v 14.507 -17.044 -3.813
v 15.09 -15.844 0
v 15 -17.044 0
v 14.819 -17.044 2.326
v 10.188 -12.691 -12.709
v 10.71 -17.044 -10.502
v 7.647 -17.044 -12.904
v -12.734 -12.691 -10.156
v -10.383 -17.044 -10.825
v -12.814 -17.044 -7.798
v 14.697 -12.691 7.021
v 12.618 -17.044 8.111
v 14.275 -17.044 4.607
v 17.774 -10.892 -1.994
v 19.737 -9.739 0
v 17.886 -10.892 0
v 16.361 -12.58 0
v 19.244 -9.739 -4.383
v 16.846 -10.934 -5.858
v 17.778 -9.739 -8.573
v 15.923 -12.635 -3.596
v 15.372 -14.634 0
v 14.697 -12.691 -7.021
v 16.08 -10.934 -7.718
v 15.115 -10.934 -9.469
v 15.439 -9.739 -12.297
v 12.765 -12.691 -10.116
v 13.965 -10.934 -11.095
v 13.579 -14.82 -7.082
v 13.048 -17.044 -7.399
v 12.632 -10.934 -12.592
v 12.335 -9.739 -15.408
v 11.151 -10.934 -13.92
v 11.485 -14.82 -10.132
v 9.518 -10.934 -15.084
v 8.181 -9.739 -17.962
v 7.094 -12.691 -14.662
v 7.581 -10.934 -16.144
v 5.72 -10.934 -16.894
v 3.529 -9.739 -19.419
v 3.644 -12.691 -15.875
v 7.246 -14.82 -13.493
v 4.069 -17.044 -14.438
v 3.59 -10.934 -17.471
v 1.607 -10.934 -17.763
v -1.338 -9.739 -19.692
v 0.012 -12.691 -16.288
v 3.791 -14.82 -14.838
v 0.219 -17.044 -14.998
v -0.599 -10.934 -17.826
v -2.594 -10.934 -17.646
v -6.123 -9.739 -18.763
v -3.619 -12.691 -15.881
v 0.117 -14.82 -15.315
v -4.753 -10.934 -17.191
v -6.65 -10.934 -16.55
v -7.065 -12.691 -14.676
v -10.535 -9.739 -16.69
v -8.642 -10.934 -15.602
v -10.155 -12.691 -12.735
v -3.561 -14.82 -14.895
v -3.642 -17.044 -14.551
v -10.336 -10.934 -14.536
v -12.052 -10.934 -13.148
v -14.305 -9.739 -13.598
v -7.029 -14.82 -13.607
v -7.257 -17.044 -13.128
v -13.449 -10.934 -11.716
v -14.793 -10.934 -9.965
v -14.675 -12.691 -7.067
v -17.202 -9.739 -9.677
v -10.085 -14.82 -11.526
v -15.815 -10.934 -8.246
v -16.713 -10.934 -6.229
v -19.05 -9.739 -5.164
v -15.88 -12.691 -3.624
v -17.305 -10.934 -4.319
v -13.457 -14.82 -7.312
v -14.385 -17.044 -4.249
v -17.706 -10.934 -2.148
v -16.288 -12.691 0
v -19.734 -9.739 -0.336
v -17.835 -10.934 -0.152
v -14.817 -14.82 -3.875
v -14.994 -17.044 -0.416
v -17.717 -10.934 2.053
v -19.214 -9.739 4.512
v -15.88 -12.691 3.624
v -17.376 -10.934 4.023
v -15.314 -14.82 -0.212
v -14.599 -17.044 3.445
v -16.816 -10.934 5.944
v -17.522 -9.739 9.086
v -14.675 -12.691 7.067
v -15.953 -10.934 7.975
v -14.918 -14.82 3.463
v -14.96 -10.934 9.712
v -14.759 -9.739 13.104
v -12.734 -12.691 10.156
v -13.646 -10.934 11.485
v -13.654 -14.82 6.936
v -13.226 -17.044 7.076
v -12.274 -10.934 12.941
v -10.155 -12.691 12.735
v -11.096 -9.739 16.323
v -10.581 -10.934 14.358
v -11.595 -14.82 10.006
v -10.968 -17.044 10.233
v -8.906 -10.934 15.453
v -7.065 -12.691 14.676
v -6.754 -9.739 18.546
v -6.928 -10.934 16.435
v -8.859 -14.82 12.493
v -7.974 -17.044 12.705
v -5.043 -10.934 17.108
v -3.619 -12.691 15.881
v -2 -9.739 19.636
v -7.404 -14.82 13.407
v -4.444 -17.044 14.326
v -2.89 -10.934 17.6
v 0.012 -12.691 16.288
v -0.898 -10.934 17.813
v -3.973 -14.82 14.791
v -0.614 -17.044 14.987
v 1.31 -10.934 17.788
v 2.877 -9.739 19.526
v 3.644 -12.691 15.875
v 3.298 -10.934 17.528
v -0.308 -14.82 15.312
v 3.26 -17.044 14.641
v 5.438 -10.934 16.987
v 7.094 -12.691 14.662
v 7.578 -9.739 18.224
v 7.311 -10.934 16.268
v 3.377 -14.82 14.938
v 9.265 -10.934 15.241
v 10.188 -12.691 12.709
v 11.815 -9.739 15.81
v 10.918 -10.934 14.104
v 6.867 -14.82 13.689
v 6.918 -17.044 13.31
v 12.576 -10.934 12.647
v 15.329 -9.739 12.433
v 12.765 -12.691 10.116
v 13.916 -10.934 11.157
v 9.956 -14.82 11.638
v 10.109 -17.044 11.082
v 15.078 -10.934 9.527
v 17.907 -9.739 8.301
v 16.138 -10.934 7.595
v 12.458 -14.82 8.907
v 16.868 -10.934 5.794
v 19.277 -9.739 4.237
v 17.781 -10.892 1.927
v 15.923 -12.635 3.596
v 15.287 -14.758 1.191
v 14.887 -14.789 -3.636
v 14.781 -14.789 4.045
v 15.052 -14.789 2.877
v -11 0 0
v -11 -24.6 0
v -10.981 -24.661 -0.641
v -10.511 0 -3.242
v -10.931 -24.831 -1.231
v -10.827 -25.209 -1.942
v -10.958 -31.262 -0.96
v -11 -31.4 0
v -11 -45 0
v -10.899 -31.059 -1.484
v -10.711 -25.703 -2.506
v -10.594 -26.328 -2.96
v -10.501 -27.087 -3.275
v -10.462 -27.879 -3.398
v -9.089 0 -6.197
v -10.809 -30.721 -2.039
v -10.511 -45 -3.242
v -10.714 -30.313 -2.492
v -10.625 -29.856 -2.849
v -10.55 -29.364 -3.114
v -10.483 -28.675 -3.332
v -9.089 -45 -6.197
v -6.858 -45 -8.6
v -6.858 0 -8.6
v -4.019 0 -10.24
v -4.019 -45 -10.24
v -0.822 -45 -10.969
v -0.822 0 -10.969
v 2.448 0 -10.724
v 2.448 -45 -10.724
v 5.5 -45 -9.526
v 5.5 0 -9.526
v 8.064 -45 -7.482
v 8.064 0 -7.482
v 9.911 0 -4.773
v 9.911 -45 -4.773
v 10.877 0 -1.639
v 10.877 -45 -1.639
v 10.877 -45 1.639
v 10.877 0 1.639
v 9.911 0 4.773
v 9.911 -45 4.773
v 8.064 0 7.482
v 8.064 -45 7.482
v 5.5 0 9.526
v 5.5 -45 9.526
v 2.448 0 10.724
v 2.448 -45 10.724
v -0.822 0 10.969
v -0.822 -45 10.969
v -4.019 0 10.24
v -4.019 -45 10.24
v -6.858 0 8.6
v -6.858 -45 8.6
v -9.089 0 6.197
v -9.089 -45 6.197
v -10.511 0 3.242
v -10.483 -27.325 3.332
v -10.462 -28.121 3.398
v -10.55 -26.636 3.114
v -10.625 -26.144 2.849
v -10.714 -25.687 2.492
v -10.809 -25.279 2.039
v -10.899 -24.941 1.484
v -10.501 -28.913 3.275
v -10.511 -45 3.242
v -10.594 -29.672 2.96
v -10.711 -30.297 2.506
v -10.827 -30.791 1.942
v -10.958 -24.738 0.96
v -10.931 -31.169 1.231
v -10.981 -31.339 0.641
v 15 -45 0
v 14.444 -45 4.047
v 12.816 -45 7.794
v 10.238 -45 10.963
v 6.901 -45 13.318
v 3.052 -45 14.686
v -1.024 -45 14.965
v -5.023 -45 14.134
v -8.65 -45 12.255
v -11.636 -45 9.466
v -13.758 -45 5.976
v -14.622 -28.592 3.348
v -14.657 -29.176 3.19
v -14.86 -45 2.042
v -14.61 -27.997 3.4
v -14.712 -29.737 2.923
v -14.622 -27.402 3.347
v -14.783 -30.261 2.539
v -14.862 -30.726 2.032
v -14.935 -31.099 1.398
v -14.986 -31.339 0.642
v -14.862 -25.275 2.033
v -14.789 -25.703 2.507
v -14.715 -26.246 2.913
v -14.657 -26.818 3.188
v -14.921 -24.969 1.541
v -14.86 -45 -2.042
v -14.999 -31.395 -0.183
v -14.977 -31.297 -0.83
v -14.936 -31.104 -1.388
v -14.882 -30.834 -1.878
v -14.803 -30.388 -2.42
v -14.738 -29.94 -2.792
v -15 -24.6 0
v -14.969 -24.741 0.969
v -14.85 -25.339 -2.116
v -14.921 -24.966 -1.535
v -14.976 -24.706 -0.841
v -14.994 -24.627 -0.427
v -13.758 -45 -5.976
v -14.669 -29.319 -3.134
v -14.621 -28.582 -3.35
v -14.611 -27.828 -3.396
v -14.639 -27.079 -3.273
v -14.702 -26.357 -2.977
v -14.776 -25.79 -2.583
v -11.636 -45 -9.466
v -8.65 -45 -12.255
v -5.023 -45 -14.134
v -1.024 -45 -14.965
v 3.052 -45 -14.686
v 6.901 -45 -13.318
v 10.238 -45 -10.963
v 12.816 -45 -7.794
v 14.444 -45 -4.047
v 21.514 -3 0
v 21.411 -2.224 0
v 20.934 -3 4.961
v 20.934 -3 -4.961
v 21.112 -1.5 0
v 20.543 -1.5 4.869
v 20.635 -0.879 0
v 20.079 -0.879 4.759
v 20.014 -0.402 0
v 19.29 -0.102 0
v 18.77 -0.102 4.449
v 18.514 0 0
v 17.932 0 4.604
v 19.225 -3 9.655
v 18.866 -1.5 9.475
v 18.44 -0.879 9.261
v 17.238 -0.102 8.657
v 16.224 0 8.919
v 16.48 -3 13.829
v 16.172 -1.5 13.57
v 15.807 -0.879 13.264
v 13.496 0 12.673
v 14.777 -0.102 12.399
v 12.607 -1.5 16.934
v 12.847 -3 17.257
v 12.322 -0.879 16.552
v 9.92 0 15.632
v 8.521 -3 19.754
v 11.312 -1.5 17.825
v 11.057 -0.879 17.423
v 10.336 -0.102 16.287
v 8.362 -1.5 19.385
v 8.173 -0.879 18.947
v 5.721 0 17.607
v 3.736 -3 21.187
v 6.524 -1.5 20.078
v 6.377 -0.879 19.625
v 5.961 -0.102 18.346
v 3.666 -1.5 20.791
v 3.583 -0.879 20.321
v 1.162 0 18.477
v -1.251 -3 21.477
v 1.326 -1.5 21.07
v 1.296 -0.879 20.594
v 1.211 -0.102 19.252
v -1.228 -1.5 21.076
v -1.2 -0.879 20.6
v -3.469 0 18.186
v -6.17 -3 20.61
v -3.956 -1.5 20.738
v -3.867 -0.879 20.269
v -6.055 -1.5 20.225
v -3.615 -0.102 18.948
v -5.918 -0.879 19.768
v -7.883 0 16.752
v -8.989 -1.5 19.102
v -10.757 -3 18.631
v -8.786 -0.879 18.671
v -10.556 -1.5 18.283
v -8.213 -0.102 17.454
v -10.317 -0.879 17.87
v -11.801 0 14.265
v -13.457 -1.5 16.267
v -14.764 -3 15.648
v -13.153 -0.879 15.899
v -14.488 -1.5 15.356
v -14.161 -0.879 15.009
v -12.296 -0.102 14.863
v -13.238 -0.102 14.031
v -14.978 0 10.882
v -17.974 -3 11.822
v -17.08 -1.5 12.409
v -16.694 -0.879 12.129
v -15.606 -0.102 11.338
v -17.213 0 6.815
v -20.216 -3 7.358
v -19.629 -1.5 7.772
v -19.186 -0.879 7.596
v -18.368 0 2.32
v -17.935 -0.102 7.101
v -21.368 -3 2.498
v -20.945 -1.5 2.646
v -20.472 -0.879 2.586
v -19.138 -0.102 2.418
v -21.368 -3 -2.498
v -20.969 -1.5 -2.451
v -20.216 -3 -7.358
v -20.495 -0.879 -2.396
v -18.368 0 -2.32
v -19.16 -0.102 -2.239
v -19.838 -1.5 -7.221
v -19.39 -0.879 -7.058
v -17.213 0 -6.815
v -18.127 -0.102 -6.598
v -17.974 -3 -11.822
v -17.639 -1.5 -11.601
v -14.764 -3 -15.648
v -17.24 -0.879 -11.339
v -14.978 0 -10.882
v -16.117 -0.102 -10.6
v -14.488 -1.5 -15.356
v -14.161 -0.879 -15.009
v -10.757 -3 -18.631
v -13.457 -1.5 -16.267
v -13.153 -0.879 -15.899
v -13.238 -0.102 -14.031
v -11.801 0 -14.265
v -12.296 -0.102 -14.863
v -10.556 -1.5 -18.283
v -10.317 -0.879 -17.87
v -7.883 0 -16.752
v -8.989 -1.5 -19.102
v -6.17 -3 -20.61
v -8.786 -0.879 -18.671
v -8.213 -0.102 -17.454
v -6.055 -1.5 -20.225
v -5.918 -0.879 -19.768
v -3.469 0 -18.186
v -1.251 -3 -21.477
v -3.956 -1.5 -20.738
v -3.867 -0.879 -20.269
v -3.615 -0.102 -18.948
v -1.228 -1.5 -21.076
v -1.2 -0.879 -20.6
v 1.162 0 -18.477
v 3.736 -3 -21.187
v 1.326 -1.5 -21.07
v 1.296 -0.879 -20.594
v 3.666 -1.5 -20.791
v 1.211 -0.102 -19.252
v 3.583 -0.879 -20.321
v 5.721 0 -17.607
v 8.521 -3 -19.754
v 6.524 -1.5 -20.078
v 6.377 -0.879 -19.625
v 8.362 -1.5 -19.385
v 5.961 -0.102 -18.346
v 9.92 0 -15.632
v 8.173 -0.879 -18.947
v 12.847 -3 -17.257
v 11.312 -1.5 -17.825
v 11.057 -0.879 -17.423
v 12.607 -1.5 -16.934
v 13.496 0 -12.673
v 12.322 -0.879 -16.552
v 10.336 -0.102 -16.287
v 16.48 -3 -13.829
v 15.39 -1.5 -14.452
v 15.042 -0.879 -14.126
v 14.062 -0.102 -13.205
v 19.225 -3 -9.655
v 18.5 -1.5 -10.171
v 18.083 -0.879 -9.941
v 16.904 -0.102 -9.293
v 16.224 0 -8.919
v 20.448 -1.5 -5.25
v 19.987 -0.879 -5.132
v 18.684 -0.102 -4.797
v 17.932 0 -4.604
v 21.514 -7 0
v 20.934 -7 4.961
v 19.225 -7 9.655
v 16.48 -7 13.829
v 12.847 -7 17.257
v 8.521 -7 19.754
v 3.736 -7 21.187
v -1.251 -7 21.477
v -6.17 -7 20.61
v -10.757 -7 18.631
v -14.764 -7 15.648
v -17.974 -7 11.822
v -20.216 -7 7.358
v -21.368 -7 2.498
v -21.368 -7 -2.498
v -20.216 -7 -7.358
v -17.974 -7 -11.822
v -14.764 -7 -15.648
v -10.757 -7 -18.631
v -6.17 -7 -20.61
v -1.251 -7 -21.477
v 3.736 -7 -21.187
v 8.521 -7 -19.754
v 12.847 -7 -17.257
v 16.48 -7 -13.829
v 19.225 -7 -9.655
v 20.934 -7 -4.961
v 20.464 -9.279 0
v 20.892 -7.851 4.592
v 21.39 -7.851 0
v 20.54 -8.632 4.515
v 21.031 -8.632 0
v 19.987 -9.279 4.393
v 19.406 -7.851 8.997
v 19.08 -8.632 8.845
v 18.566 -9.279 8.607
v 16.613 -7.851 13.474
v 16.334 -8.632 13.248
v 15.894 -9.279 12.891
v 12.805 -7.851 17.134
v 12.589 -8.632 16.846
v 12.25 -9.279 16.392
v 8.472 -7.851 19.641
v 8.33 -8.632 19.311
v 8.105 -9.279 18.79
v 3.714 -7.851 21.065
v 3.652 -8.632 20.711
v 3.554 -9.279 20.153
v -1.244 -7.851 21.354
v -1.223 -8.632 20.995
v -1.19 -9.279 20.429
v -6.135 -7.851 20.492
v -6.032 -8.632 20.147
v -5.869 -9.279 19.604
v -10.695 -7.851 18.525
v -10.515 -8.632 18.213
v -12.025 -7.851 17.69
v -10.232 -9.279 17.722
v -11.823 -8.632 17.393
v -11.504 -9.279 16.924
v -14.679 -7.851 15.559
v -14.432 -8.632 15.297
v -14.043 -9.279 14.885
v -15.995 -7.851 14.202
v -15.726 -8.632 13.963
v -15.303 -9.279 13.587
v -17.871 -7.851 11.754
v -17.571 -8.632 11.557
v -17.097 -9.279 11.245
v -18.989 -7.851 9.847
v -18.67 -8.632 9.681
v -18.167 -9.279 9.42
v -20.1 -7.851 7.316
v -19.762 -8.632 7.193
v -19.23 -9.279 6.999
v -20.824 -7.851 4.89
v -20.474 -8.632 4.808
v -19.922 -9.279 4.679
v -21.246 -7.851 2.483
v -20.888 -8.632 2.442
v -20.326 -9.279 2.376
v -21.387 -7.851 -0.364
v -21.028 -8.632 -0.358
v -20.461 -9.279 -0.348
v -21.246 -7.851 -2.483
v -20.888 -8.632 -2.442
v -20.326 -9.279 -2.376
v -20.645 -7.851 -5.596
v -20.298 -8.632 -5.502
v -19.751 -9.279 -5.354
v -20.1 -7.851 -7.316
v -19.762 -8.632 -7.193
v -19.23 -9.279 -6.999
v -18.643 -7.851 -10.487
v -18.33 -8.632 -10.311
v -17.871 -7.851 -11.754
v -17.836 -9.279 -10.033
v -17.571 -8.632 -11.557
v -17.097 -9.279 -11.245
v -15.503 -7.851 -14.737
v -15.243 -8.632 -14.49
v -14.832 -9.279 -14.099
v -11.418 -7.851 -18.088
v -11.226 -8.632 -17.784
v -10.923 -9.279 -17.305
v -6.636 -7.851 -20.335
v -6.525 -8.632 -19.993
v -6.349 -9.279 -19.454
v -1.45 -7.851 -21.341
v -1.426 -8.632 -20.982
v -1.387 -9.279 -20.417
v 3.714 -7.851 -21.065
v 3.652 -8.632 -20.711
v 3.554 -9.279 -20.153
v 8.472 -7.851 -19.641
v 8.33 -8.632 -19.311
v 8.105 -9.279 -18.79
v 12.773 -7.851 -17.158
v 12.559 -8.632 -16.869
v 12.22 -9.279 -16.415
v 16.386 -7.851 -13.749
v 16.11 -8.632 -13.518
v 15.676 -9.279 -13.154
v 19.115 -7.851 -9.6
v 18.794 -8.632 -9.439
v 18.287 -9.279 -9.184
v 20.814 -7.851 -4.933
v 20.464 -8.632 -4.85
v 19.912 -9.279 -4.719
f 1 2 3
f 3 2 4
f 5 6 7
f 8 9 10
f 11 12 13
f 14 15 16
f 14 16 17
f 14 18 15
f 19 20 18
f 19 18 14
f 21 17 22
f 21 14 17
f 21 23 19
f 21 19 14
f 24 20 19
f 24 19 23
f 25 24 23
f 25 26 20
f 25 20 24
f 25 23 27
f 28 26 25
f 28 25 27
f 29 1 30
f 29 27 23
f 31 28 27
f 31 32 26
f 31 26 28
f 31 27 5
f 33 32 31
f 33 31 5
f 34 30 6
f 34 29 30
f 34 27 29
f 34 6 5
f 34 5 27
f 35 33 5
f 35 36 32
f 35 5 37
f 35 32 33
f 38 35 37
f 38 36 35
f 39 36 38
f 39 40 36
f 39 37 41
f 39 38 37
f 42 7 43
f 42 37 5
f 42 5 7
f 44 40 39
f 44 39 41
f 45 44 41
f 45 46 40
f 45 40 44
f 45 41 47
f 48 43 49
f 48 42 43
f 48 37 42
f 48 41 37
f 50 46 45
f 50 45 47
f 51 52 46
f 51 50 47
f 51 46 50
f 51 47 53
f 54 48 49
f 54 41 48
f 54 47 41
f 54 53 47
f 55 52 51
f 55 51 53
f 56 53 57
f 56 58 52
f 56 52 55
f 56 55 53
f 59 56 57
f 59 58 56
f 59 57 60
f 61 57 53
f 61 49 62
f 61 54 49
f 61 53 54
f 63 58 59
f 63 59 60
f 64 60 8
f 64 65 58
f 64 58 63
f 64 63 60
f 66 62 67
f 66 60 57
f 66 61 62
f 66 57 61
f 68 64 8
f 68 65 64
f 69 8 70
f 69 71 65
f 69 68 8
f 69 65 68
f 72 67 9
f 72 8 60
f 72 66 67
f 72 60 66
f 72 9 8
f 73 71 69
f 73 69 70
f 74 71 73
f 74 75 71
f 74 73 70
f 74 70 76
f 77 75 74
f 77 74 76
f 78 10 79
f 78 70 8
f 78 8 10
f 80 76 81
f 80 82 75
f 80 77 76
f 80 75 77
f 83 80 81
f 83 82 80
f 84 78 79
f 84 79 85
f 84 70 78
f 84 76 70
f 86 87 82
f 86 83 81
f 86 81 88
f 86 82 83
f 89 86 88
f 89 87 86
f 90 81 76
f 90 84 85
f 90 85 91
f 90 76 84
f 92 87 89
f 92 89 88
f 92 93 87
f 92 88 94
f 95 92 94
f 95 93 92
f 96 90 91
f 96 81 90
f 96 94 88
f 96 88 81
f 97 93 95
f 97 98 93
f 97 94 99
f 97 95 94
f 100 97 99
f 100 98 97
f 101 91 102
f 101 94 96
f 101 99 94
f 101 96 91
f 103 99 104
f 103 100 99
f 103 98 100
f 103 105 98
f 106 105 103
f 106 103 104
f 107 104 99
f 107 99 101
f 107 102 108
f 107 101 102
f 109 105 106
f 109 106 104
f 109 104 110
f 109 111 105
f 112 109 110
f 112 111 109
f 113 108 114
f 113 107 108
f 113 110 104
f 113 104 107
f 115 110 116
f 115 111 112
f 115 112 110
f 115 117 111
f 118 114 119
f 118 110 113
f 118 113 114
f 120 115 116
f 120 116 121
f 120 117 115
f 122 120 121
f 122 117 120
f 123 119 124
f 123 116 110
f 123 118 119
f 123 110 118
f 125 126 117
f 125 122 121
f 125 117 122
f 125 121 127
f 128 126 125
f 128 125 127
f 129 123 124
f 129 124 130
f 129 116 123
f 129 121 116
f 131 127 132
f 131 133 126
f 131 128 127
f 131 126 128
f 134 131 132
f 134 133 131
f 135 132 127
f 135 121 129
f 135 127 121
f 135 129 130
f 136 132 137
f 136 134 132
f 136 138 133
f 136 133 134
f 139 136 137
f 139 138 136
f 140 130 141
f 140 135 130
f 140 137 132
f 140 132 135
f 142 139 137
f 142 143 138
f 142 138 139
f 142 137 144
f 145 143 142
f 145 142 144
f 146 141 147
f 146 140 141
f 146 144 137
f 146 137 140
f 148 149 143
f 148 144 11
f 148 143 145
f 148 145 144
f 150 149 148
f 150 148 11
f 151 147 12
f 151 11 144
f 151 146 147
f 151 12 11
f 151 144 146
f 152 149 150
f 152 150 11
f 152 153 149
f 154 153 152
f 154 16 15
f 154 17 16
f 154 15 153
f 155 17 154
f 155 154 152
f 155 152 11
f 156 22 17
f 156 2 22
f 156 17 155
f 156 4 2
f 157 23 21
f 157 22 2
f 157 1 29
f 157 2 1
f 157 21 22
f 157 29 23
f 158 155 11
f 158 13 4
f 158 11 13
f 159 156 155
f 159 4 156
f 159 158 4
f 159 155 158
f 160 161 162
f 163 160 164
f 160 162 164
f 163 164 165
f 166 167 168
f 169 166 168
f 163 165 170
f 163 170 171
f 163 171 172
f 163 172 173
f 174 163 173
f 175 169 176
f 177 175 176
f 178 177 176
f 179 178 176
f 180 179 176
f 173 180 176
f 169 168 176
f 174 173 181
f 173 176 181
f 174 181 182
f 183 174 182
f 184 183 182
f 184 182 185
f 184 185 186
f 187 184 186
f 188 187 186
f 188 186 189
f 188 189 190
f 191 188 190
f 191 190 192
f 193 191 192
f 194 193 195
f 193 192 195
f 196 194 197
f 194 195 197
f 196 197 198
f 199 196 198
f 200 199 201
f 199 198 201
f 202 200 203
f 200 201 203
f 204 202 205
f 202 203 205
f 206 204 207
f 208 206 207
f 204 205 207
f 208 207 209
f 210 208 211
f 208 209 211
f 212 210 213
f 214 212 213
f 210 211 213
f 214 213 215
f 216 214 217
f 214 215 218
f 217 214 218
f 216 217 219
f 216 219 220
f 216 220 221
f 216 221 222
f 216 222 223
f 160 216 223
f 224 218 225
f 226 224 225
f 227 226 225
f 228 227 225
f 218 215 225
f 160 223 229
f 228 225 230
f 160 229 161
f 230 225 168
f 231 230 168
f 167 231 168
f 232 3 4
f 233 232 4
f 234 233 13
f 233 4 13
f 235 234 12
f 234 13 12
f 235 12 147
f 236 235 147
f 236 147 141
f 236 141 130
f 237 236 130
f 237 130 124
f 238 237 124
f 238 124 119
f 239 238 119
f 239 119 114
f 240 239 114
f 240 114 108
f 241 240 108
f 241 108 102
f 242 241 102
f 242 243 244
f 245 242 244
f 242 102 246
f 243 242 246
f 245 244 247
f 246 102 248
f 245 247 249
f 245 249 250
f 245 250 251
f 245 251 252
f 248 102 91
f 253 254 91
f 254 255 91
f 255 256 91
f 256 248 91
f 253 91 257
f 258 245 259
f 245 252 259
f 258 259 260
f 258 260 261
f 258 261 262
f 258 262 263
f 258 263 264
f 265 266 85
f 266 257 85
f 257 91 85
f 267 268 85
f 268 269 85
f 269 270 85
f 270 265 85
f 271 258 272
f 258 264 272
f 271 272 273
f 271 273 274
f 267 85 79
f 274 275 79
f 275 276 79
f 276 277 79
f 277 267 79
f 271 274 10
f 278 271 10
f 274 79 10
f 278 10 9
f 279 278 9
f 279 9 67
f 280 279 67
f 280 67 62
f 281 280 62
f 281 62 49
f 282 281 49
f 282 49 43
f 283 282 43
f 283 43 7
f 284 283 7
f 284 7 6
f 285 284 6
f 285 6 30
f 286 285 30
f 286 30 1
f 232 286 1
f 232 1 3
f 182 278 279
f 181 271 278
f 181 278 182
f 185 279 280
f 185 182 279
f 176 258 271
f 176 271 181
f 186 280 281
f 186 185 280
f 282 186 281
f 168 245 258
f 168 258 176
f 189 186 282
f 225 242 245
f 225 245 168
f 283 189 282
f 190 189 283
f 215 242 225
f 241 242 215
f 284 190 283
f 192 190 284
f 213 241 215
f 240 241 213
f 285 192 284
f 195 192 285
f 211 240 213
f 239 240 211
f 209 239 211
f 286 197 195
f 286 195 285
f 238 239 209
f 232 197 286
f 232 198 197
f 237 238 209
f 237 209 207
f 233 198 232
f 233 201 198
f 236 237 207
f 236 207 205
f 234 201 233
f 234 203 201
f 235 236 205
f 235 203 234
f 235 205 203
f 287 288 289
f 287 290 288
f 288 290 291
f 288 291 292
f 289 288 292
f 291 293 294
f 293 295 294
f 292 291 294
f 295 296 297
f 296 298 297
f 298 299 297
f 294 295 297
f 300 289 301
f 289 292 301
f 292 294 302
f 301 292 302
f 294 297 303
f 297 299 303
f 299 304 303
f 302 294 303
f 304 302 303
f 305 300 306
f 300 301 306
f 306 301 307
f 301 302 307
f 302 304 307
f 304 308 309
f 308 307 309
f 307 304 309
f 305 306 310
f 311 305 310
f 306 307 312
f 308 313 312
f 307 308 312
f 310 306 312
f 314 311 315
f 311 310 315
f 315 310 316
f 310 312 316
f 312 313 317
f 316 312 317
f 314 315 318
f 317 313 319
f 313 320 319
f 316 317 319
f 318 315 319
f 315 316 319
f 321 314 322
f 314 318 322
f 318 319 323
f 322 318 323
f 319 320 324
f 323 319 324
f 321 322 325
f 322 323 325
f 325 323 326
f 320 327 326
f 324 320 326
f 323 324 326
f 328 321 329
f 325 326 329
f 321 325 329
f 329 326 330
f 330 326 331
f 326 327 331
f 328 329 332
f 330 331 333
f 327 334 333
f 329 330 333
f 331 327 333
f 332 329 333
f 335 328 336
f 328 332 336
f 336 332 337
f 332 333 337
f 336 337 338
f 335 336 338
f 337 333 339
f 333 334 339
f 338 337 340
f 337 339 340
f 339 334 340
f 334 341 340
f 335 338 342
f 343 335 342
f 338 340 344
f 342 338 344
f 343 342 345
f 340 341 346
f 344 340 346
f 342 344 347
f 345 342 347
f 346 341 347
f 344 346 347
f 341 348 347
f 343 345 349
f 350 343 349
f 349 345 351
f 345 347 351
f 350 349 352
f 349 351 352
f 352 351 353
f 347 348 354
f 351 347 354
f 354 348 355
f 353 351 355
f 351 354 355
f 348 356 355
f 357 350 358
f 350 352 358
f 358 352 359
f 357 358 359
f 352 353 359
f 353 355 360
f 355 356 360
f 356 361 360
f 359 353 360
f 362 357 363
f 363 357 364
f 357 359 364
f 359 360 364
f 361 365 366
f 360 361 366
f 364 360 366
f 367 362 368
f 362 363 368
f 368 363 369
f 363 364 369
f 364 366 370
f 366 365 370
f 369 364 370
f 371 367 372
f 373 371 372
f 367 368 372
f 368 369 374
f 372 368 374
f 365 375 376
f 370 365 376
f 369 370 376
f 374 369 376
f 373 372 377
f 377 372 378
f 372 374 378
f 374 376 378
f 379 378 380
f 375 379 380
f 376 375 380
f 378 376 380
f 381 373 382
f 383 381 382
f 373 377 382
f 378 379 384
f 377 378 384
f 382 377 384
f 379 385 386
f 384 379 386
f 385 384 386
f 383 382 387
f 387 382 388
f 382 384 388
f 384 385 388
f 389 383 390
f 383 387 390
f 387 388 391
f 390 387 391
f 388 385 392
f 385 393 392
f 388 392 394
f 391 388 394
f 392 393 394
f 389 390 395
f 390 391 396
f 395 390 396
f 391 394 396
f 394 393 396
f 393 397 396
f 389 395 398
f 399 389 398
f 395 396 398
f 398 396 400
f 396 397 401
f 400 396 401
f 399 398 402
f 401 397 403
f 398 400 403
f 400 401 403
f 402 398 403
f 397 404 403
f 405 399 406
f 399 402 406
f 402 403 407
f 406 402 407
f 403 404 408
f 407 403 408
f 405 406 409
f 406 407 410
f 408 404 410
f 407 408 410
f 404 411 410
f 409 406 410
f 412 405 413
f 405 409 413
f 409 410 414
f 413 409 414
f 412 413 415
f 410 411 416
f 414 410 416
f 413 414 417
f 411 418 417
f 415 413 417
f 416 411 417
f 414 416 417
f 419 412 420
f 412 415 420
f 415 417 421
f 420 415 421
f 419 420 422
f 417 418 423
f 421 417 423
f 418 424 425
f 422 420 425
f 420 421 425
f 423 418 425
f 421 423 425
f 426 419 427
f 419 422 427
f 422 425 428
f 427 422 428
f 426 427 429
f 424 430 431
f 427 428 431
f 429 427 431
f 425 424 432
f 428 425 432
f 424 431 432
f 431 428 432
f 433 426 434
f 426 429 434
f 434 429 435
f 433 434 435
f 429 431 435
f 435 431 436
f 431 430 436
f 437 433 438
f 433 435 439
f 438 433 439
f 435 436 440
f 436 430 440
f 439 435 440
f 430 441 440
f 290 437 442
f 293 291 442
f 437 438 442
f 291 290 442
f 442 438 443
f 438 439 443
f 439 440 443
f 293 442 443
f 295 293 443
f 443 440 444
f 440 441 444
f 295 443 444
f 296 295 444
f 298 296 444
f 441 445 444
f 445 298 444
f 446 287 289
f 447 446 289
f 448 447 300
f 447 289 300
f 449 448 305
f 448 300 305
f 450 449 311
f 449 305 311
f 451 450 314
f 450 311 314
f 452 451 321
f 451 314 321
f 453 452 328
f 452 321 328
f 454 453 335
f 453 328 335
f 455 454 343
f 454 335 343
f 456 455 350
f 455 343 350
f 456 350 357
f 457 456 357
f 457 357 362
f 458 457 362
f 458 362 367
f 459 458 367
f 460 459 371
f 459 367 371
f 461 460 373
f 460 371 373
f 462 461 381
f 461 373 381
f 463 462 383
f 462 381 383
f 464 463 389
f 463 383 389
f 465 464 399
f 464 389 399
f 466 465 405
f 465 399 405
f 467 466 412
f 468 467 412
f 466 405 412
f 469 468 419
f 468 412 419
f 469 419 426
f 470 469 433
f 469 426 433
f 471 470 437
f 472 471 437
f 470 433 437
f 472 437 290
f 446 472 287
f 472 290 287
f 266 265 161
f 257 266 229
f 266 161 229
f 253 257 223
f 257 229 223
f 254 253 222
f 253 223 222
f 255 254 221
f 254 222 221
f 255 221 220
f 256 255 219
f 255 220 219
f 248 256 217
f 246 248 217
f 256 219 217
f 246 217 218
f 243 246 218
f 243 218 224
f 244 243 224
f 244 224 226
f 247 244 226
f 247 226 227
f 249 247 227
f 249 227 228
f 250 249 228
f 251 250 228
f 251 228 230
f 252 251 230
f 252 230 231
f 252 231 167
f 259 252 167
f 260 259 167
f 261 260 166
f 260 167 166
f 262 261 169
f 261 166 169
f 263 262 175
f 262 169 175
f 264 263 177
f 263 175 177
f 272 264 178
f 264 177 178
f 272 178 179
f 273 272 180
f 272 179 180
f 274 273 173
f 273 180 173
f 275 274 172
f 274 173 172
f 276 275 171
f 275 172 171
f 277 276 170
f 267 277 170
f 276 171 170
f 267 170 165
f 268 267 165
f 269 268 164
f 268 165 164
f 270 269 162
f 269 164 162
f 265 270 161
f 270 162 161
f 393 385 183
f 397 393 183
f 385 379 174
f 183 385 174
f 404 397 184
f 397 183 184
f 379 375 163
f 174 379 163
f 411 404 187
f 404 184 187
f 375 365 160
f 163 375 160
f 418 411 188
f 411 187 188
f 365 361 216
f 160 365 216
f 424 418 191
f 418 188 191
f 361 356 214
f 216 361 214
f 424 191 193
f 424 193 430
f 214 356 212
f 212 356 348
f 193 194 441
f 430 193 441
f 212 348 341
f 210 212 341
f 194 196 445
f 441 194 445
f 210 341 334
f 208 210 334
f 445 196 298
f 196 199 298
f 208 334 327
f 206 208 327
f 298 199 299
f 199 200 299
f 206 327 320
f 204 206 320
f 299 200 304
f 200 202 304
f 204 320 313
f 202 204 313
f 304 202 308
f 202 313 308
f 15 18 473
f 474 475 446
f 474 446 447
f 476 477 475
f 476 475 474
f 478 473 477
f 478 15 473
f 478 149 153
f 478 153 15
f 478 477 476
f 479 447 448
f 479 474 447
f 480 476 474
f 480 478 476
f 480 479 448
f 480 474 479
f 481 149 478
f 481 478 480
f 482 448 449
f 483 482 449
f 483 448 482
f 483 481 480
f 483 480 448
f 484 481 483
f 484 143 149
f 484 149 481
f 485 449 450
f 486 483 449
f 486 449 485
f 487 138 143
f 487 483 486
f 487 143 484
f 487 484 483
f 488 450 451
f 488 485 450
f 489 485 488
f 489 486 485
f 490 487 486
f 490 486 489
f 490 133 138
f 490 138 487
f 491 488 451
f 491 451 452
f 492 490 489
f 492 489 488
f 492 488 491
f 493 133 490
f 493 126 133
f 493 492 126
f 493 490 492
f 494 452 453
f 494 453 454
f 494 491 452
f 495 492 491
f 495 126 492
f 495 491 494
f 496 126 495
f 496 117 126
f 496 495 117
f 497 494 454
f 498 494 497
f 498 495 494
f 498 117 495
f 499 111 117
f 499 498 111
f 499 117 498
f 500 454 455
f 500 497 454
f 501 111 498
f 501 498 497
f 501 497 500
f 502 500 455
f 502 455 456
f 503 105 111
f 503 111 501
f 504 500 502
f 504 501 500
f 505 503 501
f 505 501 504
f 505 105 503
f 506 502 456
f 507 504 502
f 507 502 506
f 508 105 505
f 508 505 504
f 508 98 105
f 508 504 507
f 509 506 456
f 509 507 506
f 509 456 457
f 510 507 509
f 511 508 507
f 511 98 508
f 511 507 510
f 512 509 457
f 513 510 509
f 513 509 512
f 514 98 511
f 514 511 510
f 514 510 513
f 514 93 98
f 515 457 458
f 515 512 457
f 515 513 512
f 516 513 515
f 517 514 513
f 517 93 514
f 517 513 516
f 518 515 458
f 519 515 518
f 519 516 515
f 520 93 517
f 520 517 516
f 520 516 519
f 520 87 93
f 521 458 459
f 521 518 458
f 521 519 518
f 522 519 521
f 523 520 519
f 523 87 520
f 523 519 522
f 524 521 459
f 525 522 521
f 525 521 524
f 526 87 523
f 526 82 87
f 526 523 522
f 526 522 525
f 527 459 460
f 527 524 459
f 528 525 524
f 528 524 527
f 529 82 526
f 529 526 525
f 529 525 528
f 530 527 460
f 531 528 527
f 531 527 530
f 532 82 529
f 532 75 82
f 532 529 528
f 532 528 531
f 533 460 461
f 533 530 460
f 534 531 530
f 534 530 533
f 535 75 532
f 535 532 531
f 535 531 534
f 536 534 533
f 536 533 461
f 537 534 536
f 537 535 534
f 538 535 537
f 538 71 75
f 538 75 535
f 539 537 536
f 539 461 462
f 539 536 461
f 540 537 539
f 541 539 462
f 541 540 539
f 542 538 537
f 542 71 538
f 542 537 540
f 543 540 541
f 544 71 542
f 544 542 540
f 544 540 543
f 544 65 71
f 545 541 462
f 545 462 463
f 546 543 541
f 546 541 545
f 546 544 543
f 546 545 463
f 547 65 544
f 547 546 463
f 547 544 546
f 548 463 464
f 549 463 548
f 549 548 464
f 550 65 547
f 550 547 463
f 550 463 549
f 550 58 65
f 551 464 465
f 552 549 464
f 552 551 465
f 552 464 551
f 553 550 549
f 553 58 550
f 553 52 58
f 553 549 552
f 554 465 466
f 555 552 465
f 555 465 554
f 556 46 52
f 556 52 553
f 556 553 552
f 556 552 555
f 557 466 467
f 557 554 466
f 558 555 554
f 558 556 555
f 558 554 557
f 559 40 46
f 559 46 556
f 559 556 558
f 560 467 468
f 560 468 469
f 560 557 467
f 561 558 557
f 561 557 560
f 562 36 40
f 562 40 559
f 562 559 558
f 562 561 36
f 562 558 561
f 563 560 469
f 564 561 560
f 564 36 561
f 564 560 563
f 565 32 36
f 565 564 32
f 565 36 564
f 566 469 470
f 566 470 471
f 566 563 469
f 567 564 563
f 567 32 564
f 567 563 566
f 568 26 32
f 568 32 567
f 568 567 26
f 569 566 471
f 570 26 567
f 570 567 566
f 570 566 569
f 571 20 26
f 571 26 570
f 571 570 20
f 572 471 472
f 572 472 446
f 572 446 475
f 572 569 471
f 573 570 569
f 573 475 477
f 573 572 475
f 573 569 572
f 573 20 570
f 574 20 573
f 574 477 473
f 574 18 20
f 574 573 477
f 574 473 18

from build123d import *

# Parameters (mm, degrees)
F0_R     = 15
F1_DEPTH = 45
F2_R     = 21.5135879258
F3_DEPTH = 10
F4_D     = 22
F6_D     = 6.8
F6_DEPTH = 21.5145879258
F7_R     = 3
F8_R     = 8


with BuildPart() as f1:
    # F0 (on Front) → F1 (new body)
    with BuildSketch(Plane.XZ):
        Circle(F0_R)
    extrude(amount=F1_DEPTH)

    # F2 (on Front) → F3 (join)
    with BuildSketch(Plane.XZ):
        Circle(F2_R)
    extrude(amount=F3_DEPTH)

    # F4 (through all)
    with Locations(Plane(origin=(0, 0, 0), x_dir=(1, 0, 0), z_dir=(0, 1, 0))):
        with Locations((0, 0)):
            Hole(F4_D / 2)

    # F6 (through all, one way)
    with BuildSketch(Plane.YZ):
        with Locations((-28, 0)):
            Circle(F6_D / 2)
    extrude(amount=-F6_DEPTH, mode=Mode.SUBTRACT)

    # F7
    f7_edges = [f1.edges().sort_by_distance(p)[0] for p in [
        (21.513588, -5, 0),
        (-21.513588, 0, 0),
        (-21.513588, -10, 0),
    ]]
    fillet(f7_edges, radius=F7_R)

    # F8
    f8_edges = [f1.edges().sort_by_distance(p)[0] for p in [
        (-15, -10, 0),
    ]]
    fillet(f8_edges, radius=F8_R)


solid = f1.part
